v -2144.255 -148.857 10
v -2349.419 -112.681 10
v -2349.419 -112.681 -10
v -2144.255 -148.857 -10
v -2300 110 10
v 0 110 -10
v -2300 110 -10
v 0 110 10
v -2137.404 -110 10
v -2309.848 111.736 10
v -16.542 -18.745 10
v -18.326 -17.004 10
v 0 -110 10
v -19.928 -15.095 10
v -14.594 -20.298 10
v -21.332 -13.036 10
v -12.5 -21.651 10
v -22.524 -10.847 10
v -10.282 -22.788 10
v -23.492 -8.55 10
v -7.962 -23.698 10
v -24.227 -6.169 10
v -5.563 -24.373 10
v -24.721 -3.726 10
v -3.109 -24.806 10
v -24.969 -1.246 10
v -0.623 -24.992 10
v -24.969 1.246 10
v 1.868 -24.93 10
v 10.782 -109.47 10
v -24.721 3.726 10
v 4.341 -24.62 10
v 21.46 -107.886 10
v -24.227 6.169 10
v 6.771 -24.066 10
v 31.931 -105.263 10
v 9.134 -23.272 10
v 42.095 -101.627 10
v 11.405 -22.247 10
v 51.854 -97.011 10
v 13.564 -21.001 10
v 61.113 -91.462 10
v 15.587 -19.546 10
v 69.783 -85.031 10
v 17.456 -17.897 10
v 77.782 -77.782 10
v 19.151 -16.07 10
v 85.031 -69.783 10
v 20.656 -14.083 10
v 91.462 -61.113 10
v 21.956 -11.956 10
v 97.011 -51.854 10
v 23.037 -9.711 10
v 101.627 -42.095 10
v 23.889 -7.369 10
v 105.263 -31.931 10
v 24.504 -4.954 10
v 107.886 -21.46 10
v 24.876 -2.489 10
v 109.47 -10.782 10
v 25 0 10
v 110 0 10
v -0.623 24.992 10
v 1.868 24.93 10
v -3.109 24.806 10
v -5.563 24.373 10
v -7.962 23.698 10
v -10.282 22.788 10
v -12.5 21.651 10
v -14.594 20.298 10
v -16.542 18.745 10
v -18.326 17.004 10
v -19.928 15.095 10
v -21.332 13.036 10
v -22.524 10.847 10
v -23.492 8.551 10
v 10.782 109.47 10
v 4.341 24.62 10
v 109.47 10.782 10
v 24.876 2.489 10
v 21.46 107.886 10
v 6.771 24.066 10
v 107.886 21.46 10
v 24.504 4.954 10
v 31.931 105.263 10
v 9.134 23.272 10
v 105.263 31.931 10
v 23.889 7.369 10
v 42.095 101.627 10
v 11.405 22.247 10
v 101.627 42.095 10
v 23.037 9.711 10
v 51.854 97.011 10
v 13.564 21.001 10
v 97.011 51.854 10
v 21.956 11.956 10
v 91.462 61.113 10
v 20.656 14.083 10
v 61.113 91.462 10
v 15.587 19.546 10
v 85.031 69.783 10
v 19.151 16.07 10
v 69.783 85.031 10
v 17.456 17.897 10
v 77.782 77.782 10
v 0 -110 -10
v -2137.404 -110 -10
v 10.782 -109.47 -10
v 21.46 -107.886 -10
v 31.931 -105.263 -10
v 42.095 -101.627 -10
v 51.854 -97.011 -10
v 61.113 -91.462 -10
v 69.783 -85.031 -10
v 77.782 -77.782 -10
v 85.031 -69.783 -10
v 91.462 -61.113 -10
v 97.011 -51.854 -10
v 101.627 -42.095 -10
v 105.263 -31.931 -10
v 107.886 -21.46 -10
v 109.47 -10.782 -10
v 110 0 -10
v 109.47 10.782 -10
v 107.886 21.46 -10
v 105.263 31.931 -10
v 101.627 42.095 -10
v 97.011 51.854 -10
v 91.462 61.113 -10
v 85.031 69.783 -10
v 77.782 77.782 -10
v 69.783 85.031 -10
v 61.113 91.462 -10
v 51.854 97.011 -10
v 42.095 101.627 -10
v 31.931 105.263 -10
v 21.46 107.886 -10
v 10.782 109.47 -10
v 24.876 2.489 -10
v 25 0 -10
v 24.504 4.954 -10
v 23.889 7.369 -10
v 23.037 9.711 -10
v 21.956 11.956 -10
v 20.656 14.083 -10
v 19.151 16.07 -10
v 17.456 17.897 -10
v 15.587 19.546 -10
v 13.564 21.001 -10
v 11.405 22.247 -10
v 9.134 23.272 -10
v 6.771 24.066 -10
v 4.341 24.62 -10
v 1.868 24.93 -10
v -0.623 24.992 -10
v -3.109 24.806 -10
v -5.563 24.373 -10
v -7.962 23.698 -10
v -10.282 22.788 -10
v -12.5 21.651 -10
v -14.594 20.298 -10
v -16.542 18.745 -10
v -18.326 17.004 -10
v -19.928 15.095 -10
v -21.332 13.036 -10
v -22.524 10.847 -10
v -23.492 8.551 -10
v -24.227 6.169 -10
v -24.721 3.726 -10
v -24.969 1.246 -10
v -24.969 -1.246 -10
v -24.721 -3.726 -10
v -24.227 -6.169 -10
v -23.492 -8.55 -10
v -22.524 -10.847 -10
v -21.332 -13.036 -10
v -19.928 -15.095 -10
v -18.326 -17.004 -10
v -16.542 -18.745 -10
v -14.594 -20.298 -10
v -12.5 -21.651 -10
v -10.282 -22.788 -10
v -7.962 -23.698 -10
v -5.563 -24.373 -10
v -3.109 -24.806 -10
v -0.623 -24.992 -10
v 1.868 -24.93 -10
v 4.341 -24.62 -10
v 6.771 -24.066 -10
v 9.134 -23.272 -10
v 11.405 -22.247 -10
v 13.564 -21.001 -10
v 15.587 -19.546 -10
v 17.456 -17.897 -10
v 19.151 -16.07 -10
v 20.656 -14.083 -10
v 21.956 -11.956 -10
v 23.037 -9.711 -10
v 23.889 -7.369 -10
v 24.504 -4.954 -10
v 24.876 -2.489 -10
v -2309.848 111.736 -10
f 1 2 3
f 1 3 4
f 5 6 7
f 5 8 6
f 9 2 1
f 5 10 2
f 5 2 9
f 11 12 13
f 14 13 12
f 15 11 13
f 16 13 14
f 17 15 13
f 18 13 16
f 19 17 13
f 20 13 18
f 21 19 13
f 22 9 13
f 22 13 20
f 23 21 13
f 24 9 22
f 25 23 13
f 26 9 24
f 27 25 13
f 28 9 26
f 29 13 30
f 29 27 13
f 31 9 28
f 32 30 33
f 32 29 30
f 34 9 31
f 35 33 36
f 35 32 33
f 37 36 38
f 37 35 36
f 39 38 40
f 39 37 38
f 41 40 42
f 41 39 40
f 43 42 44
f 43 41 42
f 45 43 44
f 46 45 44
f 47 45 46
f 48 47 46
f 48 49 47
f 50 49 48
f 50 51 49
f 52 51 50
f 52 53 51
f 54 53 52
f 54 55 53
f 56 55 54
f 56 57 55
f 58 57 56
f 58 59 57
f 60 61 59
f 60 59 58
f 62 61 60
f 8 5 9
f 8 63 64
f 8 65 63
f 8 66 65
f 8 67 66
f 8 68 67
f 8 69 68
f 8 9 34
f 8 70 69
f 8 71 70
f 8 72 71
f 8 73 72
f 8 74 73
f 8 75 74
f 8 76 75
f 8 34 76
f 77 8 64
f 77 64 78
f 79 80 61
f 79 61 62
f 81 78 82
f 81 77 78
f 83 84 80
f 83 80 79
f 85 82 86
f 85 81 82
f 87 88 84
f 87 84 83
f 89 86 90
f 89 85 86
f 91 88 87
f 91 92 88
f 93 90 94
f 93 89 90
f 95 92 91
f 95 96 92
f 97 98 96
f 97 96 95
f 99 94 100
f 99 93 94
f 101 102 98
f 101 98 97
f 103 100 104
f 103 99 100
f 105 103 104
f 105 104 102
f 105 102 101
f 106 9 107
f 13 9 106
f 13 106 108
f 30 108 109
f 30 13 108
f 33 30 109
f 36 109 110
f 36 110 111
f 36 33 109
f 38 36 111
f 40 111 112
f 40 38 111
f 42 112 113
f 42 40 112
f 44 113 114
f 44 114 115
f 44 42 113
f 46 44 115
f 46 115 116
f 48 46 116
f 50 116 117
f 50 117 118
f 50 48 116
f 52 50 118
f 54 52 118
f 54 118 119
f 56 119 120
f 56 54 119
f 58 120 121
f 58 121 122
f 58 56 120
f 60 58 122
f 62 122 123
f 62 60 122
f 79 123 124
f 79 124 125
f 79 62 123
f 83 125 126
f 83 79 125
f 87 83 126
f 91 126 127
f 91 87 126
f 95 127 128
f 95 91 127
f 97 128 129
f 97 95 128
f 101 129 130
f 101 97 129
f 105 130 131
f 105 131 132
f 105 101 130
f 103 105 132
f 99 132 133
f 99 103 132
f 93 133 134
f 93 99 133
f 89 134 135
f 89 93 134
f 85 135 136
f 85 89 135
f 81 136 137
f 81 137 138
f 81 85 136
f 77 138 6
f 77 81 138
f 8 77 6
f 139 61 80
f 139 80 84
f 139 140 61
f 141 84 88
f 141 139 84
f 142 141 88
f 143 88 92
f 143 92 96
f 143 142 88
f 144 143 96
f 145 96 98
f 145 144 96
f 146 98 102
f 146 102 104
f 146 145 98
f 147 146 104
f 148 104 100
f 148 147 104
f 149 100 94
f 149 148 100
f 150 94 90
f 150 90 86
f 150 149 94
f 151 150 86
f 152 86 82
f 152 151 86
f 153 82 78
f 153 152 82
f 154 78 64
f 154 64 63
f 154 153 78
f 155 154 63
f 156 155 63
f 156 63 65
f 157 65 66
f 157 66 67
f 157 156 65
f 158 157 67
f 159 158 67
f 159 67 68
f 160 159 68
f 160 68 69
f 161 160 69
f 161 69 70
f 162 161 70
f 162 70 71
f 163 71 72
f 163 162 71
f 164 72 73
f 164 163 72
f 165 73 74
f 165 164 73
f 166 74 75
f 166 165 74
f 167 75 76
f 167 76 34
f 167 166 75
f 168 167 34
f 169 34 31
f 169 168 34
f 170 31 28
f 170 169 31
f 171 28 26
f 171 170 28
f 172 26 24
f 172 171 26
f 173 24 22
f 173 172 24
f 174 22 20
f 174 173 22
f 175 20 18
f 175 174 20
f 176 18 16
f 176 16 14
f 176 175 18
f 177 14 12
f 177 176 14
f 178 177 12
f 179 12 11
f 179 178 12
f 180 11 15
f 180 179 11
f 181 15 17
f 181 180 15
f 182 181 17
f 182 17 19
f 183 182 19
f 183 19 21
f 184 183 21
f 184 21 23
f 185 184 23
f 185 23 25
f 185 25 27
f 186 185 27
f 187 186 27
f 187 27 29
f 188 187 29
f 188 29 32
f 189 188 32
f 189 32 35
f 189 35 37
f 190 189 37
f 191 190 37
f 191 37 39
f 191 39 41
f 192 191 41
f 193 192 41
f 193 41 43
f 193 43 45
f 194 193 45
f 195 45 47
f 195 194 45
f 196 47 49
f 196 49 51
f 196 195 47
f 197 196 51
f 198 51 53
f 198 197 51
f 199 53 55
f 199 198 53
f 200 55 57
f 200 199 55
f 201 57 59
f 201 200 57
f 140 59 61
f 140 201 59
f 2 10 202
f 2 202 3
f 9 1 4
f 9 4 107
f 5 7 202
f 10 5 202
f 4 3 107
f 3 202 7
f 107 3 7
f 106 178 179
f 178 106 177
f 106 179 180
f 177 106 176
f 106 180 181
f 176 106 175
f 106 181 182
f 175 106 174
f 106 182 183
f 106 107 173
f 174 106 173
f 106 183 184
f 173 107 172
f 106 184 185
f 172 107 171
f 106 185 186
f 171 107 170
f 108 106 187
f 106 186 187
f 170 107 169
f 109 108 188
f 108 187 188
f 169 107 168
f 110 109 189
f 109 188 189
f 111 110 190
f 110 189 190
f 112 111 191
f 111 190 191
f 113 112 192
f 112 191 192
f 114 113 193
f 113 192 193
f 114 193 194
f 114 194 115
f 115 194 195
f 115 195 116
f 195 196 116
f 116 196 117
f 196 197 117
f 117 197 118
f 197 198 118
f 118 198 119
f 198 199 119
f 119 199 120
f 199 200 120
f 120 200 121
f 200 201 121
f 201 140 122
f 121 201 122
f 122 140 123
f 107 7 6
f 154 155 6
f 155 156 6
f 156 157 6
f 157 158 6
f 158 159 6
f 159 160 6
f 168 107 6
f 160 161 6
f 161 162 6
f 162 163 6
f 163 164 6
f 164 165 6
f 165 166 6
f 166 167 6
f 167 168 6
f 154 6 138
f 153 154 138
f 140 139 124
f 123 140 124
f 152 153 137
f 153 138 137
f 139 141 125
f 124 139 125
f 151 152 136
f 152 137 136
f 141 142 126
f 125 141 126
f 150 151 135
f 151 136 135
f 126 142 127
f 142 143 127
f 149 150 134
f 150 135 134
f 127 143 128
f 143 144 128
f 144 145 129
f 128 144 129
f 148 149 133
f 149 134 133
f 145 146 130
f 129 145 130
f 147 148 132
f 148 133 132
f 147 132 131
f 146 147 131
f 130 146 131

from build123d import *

# Parameters (mm, degrees)
SKETCH1_R           = 25
BOSS_EXTRUDE1_DEPTH = 10


with BuildPart() as part:
    # Sketch1 → Boss-Extrude1 (new body, symmetric)
    with BuildSketch(Plane.XY):
        with BuildLine():
            Line((-2300, 110.00001646), (-2309.84807753, 111.736498237))
            Line((-2309.84807753, 111.736498237), (-2344.209578927, -83.137259929))
            Line((-2344.209578927, -83.137259929), (-2349.419024257, -112.681492519))
            Line((-2349.419024257, -112.681492519), (-2144.255152103, -148.857418644))
            Line((-2144.255152103, -148.857418644), (-2137.403540795, -110))
            Line((-2137.403540795, -110), (0, -110))
            ThreePointArc((0, -110), (110.00000823, 8.23e-06), (0, 110.00001646))
            Line((0, 110.00001646), (-2300, 110.00001646))
        make_face()
        with Locations((0, 8.23e-06)):
            Circle(SKETCH1_R, mode=Mode.SUBTRACT)
    extrude(amount=BOSS_EXTRUDE1_DEPTH, both=True)


solid = part.part
